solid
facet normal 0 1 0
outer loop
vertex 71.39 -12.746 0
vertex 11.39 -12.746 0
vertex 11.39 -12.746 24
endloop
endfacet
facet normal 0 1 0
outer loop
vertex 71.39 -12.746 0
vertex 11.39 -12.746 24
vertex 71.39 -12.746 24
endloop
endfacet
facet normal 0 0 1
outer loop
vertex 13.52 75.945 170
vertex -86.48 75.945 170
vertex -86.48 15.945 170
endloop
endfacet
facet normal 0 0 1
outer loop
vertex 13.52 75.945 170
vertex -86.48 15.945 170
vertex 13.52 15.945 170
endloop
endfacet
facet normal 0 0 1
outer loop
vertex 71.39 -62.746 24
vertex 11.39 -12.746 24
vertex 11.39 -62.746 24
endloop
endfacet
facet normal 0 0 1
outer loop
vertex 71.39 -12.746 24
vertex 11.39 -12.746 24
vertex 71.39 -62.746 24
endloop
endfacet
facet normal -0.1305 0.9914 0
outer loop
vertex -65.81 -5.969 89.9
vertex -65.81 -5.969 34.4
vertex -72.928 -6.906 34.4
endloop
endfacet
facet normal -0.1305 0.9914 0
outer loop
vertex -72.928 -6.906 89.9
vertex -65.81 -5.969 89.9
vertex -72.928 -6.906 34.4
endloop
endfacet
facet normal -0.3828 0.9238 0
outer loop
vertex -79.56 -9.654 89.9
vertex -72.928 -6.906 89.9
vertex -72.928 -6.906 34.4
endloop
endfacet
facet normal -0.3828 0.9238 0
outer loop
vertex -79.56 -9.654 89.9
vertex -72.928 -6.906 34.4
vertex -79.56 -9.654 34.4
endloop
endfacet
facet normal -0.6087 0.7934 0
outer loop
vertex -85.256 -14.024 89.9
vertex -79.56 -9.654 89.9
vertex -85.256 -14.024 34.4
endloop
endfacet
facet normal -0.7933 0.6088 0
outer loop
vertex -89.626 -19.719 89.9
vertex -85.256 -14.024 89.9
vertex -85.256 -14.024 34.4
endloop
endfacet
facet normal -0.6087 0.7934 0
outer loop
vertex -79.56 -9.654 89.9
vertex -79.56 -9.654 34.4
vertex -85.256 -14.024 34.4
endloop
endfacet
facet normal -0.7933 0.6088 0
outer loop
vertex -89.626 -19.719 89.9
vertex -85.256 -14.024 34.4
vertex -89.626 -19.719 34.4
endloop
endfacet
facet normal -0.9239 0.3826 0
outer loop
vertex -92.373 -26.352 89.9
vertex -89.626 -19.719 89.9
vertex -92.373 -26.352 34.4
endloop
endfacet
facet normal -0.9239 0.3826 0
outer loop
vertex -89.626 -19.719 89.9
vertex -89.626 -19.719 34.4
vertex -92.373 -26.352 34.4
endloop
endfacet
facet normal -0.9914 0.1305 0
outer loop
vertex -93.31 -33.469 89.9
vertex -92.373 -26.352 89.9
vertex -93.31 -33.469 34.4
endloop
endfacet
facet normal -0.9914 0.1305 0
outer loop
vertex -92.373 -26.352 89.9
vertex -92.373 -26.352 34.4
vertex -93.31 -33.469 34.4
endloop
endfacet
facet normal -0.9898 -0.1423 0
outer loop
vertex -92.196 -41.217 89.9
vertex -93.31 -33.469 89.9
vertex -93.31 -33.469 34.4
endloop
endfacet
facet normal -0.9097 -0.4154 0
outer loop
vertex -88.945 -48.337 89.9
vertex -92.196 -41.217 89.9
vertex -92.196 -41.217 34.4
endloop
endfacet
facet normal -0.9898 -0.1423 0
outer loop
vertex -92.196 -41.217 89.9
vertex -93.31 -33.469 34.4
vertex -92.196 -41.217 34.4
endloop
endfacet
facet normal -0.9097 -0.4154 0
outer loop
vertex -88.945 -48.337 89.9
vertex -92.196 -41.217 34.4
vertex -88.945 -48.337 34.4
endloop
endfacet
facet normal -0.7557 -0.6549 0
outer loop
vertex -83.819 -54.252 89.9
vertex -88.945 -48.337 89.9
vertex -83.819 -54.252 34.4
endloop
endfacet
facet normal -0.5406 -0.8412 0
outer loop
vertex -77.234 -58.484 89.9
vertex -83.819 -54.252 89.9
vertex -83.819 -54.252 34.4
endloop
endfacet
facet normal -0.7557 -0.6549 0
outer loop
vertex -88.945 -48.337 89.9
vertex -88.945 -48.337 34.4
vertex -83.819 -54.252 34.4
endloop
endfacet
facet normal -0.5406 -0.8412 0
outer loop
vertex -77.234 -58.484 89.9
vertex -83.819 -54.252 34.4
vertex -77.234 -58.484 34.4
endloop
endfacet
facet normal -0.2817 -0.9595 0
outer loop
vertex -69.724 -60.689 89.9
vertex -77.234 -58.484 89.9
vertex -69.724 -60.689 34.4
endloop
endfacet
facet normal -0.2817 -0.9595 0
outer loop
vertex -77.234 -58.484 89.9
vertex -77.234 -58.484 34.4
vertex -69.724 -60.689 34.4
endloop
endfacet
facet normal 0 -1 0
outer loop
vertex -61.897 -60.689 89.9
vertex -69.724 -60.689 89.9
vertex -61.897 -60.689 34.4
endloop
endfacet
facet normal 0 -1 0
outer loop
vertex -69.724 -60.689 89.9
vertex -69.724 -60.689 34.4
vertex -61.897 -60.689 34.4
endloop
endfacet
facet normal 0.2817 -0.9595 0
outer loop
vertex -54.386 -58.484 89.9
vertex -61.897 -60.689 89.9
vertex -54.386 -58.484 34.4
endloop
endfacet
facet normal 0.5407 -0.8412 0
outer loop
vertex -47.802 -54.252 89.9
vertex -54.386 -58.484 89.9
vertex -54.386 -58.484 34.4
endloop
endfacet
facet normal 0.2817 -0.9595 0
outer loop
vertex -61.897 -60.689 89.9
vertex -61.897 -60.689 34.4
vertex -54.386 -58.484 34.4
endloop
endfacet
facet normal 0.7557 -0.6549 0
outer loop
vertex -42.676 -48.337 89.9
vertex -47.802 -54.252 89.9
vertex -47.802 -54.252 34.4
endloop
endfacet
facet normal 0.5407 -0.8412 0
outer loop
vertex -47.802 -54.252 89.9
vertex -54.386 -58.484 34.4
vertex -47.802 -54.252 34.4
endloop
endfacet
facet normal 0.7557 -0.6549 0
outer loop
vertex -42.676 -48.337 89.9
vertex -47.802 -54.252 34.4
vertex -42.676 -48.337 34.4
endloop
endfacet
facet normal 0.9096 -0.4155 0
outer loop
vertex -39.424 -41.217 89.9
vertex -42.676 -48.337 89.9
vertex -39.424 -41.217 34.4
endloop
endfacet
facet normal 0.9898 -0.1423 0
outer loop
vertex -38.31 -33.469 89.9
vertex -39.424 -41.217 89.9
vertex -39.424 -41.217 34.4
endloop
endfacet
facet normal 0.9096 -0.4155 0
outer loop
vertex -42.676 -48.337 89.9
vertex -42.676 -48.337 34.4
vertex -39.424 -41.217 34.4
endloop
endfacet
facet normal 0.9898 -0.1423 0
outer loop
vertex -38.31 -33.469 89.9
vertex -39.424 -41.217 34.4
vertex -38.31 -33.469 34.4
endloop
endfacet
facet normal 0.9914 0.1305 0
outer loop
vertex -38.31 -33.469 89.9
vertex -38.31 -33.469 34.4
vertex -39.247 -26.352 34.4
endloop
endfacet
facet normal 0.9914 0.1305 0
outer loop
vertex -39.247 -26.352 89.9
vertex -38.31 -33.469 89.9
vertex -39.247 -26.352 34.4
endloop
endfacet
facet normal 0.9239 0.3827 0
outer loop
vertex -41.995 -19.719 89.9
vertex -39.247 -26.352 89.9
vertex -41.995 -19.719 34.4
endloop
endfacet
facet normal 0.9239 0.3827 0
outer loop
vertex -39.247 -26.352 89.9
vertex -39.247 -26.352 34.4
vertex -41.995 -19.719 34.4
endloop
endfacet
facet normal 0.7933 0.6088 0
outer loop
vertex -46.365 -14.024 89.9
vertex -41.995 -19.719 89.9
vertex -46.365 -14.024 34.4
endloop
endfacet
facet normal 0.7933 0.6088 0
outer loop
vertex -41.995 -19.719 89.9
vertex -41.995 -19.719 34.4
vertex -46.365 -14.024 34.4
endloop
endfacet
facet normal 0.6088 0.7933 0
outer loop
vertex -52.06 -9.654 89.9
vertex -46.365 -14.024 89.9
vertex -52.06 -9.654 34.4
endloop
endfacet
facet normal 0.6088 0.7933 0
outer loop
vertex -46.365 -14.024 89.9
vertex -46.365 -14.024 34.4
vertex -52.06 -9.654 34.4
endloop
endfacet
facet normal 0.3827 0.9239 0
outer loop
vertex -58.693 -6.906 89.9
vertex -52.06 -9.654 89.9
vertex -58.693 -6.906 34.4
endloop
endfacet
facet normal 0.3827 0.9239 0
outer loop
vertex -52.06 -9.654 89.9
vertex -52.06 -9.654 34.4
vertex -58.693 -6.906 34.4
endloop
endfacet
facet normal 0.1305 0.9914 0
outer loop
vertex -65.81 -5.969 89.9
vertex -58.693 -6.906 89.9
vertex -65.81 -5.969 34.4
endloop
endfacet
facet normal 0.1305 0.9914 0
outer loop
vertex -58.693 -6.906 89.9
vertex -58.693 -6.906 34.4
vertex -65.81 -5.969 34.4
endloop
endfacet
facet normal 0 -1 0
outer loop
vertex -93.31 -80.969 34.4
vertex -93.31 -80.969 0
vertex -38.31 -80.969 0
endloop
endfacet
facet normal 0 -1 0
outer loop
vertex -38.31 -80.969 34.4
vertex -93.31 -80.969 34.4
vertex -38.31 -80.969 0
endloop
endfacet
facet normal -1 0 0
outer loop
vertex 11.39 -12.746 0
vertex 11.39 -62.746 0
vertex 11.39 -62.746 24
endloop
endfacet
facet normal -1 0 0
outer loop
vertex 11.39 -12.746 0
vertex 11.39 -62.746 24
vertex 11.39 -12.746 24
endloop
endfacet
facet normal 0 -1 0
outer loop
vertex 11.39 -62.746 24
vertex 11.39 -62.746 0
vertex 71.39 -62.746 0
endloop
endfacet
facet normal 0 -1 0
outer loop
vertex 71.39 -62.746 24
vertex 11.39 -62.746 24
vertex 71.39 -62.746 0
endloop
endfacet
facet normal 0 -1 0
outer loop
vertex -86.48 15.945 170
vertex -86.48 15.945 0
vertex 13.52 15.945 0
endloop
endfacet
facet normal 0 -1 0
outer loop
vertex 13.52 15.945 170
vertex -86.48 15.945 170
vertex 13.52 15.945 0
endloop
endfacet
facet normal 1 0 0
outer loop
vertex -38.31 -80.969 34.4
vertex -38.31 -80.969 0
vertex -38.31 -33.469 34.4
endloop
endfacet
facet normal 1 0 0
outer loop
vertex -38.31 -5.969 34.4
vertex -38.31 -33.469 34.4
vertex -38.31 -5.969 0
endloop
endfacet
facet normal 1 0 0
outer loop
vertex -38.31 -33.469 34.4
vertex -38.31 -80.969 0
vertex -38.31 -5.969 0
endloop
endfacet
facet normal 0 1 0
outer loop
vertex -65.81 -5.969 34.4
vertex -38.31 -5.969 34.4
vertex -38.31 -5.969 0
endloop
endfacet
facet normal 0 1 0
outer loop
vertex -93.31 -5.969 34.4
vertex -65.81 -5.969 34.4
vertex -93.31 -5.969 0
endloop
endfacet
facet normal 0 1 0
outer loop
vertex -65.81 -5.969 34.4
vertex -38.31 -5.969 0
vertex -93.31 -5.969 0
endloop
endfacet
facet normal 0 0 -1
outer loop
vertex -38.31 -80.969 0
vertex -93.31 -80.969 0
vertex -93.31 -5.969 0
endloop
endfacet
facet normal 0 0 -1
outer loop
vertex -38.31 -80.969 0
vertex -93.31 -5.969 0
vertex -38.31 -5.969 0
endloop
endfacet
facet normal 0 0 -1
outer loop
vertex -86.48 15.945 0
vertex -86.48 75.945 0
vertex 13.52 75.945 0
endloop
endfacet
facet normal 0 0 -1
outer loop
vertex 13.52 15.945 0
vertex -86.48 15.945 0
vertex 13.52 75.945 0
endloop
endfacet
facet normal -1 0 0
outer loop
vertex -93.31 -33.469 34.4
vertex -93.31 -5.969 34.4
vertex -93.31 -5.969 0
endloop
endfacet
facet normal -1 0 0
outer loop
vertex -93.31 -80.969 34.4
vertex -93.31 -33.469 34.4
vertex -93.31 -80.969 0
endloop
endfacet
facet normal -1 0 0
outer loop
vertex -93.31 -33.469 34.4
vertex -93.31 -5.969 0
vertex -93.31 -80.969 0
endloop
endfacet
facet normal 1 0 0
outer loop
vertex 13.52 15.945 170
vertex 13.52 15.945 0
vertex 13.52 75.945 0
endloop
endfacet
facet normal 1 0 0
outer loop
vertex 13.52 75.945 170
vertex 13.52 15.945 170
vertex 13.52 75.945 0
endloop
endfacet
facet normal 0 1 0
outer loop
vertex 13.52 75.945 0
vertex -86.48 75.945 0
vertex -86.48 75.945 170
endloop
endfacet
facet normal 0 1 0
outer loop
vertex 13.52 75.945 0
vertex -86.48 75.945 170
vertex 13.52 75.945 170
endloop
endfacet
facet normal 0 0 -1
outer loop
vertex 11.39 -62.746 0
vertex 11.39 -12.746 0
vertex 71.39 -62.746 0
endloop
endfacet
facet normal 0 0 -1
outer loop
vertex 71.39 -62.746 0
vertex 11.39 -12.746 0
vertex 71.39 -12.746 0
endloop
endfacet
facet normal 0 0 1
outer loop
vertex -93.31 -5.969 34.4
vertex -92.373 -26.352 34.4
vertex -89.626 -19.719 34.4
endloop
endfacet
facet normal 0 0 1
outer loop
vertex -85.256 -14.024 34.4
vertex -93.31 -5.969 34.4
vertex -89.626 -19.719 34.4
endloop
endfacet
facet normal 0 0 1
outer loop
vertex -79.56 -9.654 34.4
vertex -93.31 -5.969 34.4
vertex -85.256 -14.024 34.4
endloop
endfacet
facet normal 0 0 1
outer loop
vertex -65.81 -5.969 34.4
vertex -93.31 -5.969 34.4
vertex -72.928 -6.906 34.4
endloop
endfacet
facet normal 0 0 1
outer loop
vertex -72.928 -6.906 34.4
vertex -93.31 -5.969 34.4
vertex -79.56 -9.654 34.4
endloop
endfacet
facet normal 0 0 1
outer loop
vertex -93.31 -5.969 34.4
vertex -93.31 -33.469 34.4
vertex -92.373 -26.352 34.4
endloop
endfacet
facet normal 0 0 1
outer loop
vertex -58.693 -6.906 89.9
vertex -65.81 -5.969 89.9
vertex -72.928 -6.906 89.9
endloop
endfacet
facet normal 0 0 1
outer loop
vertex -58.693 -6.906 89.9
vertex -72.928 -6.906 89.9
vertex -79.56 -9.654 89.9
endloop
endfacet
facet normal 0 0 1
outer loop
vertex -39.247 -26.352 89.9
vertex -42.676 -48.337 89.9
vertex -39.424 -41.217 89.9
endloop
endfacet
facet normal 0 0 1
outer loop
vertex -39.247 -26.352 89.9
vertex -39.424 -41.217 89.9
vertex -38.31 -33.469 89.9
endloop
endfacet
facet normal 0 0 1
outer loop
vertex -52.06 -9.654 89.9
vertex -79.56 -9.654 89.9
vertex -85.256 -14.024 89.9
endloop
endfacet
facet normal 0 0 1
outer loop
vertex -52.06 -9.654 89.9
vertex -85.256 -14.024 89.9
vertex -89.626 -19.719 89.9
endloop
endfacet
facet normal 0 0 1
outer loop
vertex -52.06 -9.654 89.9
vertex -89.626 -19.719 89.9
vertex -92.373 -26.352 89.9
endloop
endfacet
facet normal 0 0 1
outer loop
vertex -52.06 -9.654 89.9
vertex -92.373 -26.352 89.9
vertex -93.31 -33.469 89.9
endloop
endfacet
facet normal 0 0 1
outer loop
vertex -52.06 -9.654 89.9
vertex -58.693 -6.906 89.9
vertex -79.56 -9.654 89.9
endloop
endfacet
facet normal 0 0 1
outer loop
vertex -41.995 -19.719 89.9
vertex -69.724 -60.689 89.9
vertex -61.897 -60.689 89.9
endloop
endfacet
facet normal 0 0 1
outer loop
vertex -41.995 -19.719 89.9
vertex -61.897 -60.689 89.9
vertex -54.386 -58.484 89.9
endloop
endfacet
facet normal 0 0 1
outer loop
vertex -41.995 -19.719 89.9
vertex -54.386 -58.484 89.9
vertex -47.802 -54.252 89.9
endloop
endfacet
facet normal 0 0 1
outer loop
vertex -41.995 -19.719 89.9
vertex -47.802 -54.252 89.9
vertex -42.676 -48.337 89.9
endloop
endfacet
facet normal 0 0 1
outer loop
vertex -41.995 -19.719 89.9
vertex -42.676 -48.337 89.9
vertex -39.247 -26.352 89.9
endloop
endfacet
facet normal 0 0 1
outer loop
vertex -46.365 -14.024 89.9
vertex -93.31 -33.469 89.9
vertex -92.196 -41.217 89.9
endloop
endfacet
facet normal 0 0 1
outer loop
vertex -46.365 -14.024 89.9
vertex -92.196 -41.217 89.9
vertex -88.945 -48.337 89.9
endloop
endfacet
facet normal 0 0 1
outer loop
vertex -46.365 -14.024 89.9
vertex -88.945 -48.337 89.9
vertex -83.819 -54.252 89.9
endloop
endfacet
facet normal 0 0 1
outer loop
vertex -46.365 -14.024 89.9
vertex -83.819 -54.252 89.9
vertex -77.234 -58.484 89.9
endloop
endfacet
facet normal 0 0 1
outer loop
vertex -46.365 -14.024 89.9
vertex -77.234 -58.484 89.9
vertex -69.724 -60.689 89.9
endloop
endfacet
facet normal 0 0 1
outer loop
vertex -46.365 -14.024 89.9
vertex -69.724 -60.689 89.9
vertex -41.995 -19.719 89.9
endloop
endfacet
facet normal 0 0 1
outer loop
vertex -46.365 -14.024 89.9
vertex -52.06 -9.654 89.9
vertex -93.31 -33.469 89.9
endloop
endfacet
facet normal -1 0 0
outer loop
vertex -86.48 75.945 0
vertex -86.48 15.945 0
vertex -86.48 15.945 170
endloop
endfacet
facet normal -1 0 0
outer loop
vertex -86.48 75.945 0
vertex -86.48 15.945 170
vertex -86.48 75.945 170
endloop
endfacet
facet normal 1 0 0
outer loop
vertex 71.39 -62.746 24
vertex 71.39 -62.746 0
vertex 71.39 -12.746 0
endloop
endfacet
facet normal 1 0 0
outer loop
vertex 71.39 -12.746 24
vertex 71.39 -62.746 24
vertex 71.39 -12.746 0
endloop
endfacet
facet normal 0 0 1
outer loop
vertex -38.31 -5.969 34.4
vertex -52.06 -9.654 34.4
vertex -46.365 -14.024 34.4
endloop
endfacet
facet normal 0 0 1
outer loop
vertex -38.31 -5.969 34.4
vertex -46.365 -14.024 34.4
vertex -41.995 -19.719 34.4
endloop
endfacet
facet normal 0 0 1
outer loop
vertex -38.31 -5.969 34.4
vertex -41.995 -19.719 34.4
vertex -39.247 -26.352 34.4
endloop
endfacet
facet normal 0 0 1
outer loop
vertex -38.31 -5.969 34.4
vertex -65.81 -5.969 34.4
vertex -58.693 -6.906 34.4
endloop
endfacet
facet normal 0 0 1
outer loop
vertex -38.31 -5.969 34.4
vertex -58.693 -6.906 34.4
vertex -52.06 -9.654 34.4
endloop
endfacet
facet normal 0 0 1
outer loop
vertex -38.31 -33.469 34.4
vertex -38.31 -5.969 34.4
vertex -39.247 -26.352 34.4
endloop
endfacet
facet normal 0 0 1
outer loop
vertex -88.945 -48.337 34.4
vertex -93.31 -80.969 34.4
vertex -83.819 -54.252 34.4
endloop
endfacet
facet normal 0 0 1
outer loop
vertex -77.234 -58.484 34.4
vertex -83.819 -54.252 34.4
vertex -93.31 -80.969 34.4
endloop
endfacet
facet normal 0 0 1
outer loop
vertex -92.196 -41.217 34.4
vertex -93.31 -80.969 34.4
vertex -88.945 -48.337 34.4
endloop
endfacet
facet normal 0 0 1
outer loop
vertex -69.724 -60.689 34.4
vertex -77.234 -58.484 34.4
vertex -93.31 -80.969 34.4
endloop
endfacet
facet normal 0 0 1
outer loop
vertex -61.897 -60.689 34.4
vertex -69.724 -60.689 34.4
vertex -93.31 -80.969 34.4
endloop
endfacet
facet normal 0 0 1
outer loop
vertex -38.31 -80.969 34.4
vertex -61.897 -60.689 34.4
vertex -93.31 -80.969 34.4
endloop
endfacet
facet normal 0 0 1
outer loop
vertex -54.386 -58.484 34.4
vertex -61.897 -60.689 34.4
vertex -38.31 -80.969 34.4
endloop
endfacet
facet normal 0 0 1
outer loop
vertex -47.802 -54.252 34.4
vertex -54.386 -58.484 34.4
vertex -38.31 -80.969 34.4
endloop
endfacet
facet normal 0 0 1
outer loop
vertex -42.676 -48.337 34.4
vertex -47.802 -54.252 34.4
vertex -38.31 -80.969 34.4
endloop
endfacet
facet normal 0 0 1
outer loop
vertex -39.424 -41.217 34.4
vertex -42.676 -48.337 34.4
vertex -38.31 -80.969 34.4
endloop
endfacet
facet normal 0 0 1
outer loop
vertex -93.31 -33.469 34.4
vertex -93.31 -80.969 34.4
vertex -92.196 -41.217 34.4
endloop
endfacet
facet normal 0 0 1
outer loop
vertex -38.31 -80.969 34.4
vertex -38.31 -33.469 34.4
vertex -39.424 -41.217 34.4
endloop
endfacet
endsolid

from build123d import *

# Parameters (mm, degrees)
F0_W     = 100
F0_H     = 60
F1_DEPTH = 170
F2_DEPTH = 89.9
F3_DEPTH = 34.4
F0_W_2   = 60
F0_H_2   = 50
F4_DEPTH = 24


with BuildPart() as f1:
    # F0 (on Top) → F1 (new body)
    with BuildSketch(Plane.XY):
        with Locations((-36.479591, 45.945349)):
            Rectangle(F0_W, F0_H)
    extrude(amount=F1_DEPTH)


with BuildPart() as f2:
    # F0 (on Top) → F2 (new body)
    with BuildSketch(Plane.XY):
        with BuildLine():
            ThreePointArc((-38.310248, -33.469244), (-46.364812, -14.023808), (-65.810248, -5.969244))
            ThreePointArc((-65.810248, -5.969244), (-85.255685, -14.023808), (-93.310248, -33.469244))
            ThreePointArc((-93.310248, -33.469244), (-65.810248, -60.969244), (-38.310248, -33.469244))
        make_face()
    extrude(amount=F2_DEPTH)

    # F0 (on Top) → F3 (join)
    with BuildSketch(Plane.XY):
        with BuildLine():
            ThreePointArc((-38.310248, -33.469244), (-65.810248, -60.969244), (-93.310248, -33.469244))
            Line((-93.310248, -33.469244), (-93.310248, -80.969244))
            Line((-93.310248, -80.969244), (-38.310248, -80.969244))
            Line((-38.310248, -80.969244), (-38.310248, -33.469244))
        make_face()
        with BuildLine():
            Line((-65.810248, -5.969244), (-93.310248, -5.969244))
            Line((-93.310248, -5.969244), (-93.310248, -33.469244))
            ThreePointArc((-93.310248, -33.469244), (-85.255685, -14.023808), (-65.810248, -5.969244))
        make_face()
        with BuildLine():
            Line((-38.310248, -5.969244), (-65.810248, -5.969244))
            ThreePointArc((-65.810248, -5.969244), (-46.364812, -14.023808), (-38.310248, -33.469244))
            Line((-38.310248, -33.469244), (-38.310248, -5.969244))
        make_face()
    extrude(amount=F3_DEPTH)


with BuildPart() as f4:
    # F0 (on Top) → F4 (new body)
    with BuildSketch(Plane.XY):
        with Locations((41.389539, -37.745988)):
            Rectangle(F0_W_2, F0_H_2)
    extrude(amount=F4_DEPTH)


solid = Compound([f1.part, f2.part, f4.part])
